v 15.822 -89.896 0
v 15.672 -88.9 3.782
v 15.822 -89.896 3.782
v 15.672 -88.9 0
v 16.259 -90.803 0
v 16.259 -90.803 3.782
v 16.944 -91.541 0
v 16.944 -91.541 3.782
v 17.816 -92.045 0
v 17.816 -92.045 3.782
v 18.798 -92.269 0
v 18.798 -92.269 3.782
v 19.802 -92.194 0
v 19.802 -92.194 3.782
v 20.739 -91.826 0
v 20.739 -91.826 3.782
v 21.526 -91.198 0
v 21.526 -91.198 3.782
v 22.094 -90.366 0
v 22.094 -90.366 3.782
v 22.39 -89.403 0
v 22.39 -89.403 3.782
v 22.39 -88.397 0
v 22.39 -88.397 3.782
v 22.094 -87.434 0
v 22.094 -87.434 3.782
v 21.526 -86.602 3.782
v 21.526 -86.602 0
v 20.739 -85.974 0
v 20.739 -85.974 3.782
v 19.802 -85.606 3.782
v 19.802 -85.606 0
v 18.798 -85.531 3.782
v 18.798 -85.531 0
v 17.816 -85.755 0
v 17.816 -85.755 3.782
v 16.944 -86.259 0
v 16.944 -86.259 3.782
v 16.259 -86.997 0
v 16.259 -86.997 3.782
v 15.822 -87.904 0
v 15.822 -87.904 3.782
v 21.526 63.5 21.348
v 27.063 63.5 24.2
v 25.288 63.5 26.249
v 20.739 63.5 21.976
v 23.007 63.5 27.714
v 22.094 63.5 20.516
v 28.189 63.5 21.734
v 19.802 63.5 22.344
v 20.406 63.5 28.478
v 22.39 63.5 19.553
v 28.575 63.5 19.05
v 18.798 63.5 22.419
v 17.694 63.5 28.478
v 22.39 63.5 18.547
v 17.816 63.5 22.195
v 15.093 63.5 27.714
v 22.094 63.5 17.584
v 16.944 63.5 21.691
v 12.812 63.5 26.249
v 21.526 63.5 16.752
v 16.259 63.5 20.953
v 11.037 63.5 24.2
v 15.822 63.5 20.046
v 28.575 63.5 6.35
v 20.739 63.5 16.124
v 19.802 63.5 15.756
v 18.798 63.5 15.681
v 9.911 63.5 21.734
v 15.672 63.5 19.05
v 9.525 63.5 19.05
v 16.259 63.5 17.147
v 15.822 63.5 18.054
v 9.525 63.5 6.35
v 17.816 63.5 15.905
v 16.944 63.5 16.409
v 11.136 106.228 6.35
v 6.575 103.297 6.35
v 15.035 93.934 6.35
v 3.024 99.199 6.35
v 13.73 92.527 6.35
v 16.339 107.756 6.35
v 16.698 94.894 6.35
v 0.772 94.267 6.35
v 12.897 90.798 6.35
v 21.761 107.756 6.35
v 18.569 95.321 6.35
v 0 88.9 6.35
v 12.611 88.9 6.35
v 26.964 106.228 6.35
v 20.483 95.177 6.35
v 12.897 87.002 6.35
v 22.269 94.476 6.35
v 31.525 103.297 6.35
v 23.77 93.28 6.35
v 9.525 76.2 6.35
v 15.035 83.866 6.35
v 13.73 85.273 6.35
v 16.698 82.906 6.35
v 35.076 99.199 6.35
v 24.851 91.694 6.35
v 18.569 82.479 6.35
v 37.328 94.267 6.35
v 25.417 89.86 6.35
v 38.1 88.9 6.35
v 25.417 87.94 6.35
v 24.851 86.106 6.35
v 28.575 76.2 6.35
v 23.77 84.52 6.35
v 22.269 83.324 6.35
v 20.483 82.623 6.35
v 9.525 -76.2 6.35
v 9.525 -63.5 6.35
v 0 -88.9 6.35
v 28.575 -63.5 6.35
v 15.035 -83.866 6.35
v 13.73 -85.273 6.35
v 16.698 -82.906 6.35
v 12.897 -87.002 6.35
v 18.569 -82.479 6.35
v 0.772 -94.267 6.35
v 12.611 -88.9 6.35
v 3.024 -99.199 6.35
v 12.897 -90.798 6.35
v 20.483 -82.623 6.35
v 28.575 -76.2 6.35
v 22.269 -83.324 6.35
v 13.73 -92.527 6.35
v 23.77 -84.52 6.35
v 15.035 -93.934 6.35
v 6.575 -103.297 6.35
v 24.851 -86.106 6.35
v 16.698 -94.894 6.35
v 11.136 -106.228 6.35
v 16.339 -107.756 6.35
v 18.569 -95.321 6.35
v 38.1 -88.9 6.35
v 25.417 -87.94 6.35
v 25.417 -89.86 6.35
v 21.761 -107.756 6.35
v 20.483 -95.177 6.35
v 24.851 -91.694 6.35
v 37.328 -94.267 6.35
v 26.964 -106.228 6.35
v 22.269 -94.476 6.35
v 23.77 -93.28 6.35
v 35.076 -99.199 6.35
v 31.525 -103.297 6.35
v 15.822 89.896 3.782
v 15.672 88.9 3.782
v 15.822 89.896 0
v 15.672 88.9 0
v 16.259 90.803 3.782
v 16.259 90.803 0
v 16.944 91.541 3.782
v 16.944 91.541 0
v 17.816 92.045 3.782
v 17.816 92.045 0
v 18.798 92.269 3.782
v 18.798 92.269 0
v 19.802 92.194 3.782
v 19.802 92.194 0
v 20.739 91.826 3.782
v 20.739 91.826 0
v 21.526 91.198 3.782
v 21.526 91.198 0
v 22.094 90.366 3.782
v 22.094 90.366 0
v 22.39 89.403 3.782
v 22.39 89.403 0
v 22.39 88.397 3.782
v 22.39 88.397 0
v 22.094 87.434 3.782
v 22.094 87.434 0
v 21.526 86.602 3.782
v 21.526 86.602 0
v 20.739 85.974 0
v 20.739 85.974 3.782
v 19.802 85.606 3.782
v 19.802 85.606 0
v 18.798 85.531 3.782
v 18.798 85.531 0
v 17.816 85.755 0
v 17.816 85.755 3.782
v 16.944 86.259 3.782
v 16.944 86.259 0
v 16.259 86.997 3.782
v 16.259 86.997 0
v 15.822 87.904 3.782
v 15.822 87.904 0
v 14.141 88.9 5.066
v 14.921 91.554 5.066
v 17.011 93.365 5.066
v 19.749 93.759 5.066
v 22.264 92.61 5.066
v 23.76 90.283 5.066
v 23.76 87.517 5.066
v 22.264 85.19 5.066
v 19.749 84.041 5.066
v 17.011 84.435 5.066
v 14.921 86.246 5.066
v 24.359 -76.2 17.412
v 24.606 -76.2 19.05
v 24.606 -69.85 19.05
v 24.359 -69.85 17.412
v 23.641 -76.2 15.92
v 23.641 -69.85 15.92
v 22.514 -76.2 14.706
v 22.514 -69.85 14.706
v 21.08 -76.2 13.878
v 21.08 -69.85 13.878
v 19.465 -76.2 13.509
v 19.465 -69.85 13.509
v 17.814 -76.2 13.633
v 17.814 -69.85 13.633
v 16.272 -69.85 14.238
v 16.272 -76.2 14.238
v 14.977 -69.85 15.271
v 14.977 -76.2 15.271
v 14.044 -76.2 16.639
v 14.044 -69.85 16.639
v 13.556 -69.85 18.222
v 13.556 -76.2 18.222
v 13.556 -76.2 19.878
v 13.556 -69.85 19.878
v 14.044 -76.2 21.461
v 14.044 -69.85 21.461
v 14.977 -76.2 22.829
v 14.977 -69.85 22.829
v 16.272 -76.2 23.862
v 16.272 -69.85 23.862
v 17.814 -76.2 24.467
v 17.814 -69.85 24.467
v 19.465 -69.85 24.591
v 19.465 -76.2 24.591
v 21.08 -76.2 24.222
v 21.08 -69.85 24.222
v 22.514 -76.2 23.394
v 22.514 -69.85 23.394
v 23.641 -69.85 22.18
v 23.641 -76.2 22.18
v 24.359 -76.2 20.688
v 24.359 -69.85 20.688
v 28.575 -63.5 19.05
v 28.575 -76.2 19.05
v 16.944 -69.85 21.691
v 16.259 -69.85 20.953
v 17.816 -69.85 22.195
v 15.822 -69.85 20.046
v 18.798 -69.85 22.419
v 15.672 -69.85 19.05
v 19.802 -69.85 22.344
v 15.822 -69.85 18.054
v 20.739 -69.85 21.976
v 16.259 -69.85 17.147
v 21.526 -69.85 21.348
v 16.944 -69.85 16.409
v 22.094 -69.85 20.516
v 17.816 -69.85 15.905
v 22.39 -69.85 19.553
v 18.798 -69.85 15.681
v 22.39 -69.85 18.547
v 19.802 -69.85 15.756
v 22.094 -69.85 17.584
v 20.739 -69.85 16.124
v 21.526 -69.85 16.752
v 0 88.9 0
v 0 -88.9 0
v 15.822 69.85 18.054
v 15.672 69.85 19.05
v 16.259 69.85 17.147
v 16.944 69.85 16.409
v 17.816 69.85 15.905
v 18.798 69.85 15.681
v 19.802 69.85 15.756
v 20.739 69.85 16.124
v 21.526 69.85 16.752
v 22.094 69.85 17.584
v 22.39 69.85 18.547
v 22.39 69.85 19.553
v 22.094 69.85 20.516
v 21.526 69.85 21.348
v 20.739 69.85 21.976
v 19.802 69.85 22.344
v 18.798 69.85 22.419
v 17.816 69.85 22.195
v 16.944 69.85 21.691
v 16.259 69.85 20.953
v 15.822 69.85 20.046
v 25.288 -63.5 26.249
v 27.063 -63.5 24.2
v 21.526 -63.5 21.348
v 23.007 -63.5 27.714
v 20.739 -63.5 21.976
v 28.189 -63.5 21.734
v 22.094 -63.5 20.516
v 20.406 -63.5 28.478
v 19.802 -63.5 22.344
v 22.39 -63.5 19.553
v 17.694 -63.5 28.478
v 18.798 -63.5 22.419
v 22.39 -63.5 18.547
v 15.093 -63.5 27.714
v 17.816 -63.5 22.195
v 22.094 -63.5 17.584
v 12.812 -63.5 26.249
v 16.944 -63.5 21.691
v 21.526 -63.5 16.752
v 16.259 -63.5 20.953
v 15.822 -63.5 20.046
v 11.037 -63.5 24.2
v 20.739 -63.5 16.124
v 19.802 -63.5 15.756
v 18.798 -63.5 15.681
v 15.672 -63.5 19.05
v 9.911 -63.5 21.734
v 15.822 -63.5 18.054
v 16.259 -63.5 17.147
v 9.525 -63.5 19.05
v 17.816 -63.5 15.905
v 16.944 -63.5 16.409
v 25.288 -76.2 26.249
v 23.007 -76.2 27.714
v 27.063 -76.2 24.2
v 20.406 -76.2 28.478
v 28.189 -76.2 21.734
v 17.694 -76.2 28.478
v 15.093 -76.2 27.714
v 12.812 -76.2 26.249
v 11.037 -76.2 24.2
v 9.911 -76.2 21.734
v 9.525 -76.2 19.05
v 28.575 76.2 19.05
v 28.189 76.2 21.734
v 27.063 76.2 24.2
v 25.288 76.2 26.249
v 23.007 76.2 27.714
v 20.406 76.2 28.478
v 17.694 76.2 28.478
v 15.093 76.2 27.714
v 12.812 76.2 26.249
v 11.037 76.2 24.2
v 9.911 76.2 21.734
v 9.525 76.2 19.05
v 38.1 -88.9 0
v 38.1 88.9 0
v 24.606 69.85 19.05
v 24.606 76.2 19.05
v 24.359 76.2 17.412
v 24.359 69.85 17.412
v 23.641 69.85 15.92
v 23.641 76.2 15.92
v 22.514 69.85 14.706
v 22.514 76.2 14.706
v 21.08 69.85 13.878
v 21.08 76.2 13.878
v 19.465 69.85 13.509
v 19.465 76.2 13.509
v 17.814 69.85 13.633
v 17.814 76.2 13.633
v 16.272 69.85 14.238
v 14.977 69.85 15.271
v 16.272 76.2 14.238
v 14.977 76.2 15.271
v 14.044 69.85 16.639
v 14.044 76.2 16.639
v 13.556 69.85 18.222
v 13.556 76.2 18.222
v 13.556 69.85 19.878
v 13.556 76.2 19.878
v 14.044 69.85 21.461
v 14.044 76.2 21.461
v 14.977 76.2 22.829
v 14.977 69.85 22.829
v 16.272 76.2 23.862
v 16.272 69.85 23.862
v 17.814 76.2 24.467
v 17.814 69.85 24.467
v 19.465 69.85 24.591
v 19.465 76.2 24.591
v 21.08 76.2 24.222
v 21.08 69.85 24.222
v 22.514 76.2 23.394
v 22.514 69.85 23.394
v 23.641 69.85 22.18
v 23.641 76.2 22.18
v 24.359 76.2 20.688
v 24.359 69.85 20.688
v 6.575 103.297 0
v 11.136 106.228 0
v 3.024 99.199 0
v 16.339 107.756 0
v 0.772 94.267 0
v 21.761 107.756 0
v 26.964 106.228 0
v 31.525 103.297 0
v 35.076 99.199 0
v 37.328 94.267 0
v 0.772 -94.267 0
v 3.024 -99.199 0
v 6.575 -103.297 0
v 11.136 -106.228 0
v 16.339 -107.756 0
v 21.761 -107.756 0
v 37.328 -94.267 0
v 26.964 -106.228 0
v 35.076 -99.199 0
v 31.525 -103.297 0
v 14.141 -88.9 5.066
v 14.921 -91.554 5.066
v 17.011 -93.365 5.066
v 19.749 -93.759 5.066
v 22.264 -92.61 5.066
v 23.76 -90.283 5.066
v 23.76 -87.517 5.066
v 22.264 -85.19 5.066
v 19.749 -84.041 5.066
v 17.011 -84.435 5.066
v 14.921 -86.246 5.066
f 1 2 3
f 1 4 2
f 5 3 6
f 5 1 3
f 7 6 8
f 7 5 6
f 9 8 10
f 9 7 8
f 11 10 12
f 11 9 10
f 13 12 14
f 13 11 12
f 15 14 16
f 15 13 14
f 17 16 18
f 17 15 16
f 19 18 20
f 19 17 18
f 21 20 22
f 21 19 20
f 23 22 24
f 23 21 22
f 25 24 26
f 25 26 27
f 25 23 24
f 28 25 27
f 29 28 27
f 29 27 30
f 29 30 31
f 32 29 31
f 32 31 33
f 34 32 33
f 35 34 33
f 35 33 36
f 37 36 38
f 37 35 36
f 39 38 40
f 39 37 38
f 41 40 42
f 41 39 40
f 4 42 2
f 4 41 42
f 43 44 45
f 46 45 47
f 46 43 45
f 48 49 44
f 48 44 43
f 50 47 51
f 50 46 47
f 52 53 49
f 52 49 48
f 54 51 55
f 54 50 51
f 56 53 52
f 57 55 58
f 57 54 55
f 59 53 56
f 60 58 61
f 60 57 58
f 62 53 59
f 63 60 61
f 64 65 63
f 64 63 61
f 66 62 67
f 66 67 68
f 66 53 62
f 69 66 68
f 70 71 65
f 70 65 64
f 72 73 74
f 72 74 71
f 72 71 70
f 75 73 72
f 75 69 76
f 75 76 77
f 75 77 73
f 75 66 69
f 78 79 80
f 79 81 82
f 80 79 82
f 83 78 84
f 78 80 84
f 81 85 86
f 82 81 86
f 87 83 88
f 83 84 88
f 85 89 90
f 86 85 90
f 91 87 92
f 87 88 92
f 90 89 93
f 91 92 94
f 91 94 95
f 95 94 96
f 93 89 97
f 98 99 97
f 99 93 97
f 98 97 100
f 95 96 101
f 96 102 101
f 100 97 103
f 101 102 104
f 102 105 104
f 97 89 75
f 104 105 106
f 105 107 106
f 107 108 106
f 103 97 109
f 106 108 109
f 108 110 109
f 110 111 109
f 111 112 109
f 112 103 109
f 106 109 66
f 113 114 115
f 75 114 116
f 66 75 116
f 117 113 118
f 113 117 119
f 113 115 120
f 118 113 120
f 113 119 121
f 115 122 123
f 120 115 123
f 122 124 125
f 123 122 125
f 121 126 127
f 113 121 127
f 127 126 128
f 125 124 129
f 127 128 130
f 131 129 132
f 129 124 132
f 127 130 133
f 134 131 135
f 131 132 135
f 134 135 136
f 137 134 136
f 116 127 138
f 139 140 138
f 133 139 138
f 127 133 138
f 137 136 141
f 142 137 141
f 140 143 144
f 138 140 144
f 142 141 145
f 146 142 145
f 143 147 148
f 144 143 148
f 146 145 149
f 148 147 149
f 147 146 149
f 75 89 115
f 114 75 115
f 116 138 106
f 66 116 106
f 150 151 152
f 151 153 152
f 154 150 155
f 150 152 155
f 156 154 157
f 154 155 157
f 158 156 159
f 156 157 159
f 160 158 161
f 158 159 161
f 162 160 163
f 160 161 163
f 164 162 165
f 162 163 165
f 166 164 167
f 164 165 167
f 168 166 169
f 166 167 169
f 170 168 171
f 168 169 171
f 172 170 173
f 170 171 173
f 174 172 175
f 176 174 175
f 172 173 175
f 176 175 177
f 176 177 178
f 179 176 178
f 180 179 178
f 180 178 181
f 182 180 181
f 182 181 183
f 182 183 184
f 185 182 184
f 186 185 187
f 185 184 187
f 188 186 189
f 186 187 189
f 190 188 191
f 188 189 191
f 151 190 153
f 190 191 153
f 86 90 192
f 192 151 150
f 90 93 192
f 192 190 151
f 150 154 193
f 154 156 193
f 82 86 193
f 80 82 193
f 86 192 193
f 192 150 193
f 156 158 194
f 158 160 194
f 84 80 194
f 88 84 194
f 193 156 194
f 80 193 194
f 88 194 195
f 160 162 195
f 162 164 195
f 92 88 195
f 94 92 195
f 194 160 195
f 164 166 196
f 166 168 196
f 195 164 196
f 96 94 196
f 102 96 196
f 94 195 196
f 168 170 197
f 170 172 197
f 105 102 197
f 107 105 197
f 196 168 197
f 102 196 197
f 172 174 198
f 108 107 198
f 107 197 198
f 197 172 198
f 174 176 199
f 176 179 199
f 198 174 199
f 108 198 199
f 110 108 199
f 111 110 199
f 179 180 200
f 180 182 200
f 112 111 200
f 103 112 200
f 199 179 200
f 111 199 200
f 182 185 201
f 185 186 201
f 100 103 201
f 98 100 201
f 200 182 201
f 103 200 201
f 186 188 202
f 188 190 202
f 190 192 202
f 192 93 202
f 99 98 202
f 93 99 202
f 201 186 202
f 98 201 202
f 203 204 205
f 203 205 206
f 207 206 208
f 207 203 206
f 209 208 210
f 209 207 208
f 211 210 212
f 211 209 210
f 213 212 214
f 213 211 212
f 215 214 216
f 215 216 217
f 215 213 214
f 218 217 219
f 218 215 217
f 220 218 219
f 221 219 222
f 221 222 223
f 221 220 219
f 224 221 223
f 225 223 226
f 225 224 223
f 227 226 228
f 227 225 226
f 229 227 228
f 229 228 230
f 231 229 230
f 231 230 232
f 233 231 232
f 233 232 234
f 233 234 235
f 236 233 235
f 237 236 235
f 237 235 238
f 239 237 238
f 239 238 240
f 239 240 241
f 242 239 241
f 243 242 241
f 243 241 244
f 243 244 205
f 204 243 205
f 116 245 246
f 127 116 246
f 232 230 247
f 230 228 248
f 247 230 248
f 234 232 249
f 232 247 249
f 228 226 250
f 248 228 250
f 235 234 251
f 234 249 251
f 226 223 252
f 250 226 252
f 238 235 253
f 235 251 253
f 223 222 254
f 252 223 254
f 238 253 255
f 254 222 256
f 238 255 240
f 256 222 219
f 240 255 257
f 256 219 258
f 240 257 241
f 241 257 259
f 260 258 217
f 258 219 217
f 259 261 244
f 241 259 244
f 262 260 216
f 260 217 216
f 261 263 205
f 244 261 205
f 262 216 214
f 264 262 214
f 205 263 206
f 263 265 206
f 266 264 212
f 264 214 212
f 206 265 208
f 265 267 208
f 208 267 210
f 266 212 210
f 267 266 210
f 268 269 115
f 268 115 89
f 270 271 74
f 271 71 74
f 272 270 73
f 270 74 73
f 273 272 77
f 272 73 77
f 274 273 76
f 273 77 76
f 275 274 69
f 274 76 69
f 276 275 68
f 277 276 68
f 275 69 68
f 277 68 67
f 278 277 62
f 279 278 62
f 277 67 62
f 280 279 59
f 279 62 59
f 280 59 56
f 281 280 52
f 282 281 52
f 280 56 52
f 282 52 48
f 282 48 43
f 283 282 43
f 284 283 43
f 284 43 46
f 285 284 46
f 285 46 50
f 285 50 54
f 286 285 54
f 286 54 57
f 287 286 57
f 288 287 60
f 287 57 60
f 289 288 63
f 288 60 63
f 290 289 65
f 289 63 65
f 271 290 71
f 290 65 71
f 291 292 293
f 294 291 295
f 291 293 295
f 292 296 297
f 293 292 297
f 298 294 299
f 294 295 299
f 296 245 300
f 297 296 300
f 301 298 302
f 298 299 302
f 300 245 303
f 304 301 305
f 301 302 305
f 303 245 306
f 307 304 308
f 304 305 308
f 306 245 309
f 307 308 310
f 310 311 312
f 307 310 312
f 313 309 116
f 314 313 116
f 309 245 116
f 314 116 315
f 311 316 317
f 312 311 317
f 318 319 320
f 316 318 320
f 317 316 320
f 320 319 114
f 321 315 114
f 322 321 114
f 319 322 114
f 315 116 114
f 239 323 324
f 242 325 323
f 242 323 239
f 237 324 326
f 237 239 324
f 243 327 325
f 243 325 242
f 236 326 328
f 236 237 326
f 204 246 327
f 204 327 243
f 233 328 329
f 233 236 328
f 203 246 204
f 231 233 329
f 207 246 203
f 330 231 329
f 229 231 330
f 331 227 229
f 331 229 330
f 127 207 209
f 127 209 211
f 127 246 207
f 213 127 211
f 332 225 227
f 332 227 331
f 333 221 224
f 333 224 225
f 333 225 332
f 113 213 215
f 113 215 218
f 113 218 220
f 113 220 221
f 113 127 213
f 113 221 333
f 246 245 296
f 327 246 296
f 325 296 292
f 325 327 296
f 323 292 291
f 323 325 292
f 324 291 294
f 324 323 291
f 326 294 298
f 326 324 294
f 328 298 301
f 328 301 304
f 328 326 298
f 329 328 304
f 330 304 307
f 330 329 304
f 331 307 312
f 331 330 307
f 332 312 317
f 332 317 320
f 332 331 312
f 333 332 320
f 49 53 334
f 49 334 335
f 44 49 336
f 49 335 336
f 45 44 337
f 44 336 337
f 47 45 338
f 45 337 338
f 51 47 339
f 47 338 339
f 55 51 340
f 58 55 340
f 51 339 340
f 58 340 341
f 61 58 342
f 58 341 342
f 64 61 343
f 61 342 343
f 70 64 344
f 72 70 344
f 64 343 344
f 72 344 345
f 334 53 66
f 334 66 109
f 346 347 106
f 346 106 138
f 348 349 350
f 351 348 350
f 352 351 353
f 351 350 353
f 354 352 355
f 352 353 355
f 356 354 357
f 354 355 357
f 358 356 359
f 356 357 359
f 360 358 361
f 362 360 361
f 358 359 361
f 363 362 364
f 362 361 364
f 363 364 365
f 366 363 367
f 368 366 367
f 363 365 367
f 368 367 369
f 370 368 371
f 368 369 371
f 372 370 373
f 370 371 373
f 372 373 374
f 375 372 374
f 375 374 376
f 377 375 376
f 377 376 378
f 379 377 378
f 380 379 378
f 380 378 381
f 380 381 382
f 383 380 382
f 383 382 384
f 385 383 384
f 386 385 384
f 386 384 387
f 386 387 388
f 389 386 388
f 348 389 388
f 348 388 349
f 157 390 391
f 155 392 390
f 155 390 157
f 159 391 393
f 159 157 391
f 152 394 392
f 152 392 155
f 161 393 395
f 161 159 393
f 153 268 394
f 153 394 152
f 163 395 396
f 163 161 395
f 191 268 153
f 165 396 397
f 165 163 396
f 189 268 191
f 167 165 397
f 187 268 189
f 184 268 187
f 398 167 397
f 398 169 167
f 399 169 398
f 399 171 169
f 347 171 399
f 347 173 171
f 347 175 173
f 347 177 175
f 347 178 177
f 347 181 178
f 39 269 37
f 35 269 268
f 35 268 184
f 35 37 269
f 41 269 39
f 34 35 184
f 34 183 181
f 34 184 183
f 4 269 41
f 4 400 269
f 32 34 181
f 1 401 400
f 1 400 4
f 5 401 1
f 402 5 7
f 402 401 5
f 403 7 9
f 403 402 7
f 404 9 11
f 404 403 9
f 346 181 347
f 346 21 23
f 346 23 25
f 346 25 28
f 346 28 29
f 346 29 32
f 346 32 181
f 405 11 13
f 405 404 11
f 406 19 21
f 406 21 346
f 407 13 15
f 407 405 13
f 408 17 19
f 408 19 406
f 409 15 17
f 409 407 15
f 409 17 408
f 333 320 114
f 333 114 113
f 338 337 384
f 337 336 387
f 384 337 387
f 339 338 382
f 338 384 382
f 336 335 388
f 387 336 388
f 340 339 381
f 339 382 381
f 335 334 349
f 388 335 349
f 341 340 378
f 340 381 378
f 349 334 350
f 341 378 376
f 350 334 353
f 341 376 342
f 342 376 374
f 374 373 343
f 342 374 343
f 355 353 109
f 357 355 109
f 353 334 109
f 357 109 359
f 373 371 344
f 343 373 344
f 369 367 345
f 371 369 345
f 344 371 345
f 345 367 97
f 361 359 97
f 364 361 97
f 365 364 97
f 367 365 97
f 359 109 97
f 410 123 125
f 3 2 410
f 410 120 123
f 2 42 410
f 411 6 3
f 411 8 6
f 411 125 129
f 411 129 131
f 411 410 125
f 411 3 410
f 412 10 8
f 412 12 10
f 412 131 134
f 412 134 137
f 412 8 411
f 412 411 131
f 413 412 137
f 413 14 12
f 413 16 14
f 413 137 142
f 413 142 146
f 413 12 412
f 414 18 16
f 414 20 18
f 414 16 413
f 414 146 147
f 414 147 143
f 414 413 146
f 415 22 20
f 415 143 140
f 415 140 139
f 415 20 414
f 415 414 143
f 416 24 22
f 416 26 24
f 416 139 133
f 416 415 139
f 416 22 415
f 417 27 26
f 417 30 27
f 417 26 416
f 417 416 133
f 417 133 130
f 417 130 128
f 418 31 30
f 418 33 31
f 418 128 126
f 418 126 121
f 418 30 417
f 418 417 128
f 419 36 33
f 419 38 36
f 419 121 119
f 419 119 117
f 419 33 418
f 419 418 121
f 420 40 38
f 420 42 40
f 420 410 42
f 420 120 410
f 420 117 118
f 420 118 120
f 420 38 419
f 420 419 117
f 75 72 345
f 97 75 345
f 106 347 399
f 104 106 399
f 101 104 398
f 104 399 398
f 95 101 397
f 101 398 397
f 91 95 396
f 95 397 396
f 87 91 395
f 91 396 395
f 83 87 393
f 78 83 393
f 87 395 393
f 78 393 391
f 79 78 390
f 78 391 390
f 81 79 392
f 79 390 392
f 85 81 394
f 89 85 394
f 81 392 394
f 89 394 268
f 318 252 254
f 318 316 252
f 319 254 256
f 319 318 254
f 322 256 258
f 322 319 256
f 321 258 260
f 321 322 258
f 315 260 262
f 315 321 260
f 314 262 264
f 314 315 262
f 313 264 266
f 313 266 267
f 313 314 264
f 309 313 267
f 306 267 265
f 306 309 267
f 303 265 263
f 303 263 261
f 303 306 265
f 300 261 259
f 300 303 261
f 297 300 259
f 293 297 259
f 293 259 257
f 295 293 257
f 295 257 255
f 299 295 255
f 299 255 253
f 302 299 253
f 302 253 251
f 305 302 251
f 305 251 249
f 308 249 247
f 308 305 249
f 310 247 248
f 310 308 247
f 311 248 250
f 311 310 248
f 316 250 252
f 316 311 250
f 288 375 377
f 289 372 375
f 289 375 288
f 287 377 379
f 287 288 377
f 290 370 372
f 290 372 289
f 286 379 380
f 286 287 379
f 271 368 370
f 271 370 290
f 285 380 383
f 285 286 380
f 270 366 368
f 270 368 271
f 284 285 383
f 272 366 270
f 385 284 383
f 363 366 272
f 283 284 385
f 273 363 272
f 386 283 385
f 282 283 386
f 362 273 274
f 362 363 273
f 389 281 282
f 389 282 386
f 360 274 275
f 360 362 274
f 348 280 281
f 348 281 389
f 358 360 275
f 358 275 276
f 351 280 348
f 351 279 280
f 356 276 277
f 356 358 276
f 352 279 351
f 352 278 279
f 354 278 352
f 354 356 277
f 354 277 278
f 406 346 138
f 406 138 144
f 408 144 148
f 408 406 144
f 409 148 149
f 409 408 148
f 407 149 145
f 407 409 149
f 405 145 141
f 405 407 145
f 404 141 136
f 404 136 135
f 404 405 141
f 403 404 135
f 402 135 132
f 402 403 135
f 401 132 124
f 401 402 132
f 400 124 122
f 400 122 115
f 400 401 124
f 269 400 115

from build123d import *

# Parameters (mm, degrees)
BOSS_EXTRUDE1_DEPTH                                 = 6.35
CSK_FOR_1_4_FLAT_HEAD_MACHINE_SCREW_100_D           = 6.7564
CSK_FOR_1_4_FLAT_HEAD_MACHINE_SCREW_100_CSINK_D     = 12.8778
CSK_FOR_1_4_FLAT_HEAD_MACHINE_SCREW_100_CSINK_ANGLE = 100
SKETCH5_W                                           = 19.05
SKETCH5_H                                           = 12.7
BOSS_EXTRUDE2_DEPTH                                 = 12.7
BOSS_EXTRUDE3_DEPTH                                 = 12.7
CBORE_FOR_1_4_SOCKET_HEAD_CAP_SCREW1_D              = 6.7564
CBORE_FOR_1_4_SOCKET_HEAD_CAP_SCREW1_DEPTH          = 12.7
CBORE_FOR_1_4_SOCKET_HEAD_CAP_SCREW1_CBORE_D        = 11.1125
CBORE_FOR_1_4_SOCKET_HEAD_CAP_SCREW1_CBORE_DEPTH    = 6.35
CBORE_FOR_1_4_SOCKET_HEAD_CAP_SCREW1_TIP            = 2.029827343


with BuildPart() as part:
    # Sketch1 → Boss-Extrude1 (new body)
    with BuildSketch(Plane.XY):
        with BuildLine():
            Line((0, 0), (38.1, 0))
            Line((38.1, 0), (38.1, 88.9))
            ThreePointArc((38.1, 88.9), (19.05, 107.95), (0, 88.9))
            Line((0, 88.9), (0, 0))
        make_face()
    extrude(amount=BOSS_EXTRUDE1_DEPTH)

    # CSK for 1/4 Flat Head Machine Screw (100)1 (through all)
    with Locations(Plane.XY.offset(6.35)):
        with Locations((19.05, 88.9)):
            CounterSinkHole(CSK_FOR_1_4_FLAT_HEAD_MACHINE_SCREW_100_D / 2, CSK_FOR_1_4_FLAT_HEAD_MACHINE_SCREW_100_CSINK_D / 2, counter_sink_angle=CSK_FOR_1_4_FLAT_HEAD_MACHINE_SCREW_100_CSINK_ANGLE)

    # Sketch5 → Boss-Extrude2 (add)
    with BuildSketch(Plane.XY.offset(6.35)):
        with Locations((19.05, 69.85)):
            Rectangle(SKETCH5_W, SKETCH5_H)
    extrude(amount=BOSS_EXTRUDE2_DEPTH)

    # Sketch6 → Boss-Extrude3 (add)
    with BuildSketch(Plane(origin=(0, 76.2, 0), x_dir=(1, 0, 0), z_dir=(0, 1, 0))):
        with BuildLine():
            Line((9.525, -19.05), (28.575, -19.05))
            ThreePointArc((28.575, -19.05), (19.05, -28.575), (9.525, -19.05))
        make_face()
    extrude(amount=-BOSS_EXTRUDE3_DEPTH)

    # CBORE for 1/4 Socket Head Cap Screw1
    with Locations(Plane(origin=(0, 76.2, 0), x_dir=(1, 0, 0), z_dir=(0, 1, 0))):
        with Locations((19.05, -19.05)):
            CounterBoreHole(CBORE_FOR_1_4_SOCKET_HEAD_CAP_SCREW1_D / 2, CBORE_FOR_1_4_SOCKET_HEAD_CAP_SCREW1_CBORE_D / 2, CBORE_FOR_1_4_SOCKET_HEAD_CAP_SCREW1_CBORE_DEPTH, depth=CBORE_FOR_1_4_SOCKET_HEAD_CAP_SCREW1_DEPTH)
            with Locations((0, 0, -(CBORE_FOR_1_4_SOCKET_HEAD_CAP_SCREW1_DEPTH + CBORE_FOR_1_4_SOCKET_HEAD_CAP_SCREW1_TIP / 2))):  # 118° drill point
                Cone(0, CBORE_FOR_1_4_SOCKET_HEAD_CAP_SCREW1_D / 2, CBORE_FOR_1_4_SOCKET_HEAD_CAP_SCREW1_TIP, mode=Mode.SUBTRACT)

    # Mirror1: part across plane


with BuildPart() as part_1:
    add(part.part)
    add(part.part.mirror(Plane(origin=(0, 0, 6.35), x_dir=(0, 0, 1), z_dir=(0, 1, 0))))


solid = part_1.part
